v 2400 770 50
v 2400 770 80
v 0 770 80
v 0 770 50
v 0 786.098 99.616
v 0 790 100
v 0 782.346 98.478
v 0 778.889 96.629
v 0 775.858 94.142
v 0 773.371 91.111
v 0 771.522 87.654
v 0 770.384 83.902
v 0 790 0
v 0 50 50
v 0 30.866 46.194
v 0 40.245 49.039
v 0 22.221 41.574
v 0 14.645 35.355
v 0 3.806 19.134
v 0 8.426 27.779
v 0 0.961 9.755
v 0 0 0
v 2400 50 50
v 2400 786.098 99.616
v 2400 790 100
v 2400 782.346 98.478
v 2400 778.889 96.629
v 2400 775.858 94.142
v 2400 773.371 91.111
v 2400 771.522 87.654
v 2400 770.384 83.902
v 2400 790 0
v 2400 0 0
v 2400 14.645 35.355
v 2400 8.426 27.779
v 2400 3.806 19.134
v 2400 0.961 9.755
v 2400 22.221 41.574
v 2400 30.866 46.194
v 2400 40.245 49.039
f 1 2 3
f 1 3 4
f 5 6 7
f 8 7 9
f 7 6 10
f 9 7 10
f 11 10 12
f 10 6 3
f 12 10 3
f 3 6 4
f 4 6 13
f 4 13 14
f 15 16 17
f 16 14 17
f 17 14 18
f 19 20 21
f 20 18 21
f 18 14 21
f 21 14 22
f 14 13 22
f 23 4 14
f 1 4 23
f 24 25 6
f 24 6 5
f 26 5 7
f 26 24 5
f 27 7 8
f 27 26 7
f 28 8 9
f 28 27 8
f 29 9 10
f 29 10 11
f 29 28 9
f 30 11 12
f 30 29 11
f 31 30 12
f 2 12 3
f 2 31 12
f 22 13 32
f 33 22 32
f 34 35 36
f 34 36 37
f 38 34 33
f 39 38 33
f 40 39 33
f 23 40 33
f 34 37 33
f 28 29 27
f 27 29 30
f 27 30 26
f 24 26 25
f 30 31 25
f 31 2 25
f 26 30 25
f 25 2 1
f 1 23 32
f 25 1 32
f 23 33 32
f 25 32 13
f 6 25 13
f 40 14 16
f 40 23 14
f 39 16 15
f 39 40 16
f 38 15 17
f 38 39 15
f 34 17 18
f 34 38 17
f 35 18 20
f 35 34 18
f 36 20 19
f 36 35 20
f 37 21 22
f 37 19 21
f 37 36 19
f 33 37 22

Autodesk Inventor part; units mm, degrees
ref_plane "YZ Plane" through (0, 0, 0) normal (1, 0, 0) x (0, 1, 0)
ref_plane "XZ Plane" through (0, 0, 0) normal (0, 1, 0) x (-1, 0, 0)
ref_plane "XY Plane" through (0, 0, 0) normal (0, 0, 1) x (1, 0, 0)
sketch "Sketch1" plane through (0, 0, 0) normal (0, 0, 1) x (1, 0, 0)
  line L0 (0, 0) -> (2400, 0)
  line L1 (2400, 0) -> (2400, 790)
  line L2 (2400, 790) -> (0, 790)
  line L3 (0, 790) -> (0, 0)
  dimension "ancho" = 2400
  dimension "d1" = 790
extrude "Extrusion1" add sketch "Sketch1" along normal blind 50
fillet "Fillet1" radius 50 1 edges at (1200, 0, 50)
sketch "Sketch2" plane through (2400, 790, 50) normal (1, 0, 0) x (0, 0, -1)
  line L0 (50, 0) -> (-50, 0)
  line L1 (-50, 0) -> (-50, 0)
  line L2 (-30, -20) -> (50, -20)
  line L3 (50, -20) -> (50, 0)
  arc A0 (-50, 0) -> (-30, -20) centre (-30, 0) ccw
  point P0 (50, -790)
  point P1 (-50, -20)
  dimension "d5" = 100
  dimension "d6" = 20
  dimension "d7" = 20
extrude "Extrusion2" add sketch "Sketch2" against normal up to surface (2400 mm away)
properties part number "meson"
